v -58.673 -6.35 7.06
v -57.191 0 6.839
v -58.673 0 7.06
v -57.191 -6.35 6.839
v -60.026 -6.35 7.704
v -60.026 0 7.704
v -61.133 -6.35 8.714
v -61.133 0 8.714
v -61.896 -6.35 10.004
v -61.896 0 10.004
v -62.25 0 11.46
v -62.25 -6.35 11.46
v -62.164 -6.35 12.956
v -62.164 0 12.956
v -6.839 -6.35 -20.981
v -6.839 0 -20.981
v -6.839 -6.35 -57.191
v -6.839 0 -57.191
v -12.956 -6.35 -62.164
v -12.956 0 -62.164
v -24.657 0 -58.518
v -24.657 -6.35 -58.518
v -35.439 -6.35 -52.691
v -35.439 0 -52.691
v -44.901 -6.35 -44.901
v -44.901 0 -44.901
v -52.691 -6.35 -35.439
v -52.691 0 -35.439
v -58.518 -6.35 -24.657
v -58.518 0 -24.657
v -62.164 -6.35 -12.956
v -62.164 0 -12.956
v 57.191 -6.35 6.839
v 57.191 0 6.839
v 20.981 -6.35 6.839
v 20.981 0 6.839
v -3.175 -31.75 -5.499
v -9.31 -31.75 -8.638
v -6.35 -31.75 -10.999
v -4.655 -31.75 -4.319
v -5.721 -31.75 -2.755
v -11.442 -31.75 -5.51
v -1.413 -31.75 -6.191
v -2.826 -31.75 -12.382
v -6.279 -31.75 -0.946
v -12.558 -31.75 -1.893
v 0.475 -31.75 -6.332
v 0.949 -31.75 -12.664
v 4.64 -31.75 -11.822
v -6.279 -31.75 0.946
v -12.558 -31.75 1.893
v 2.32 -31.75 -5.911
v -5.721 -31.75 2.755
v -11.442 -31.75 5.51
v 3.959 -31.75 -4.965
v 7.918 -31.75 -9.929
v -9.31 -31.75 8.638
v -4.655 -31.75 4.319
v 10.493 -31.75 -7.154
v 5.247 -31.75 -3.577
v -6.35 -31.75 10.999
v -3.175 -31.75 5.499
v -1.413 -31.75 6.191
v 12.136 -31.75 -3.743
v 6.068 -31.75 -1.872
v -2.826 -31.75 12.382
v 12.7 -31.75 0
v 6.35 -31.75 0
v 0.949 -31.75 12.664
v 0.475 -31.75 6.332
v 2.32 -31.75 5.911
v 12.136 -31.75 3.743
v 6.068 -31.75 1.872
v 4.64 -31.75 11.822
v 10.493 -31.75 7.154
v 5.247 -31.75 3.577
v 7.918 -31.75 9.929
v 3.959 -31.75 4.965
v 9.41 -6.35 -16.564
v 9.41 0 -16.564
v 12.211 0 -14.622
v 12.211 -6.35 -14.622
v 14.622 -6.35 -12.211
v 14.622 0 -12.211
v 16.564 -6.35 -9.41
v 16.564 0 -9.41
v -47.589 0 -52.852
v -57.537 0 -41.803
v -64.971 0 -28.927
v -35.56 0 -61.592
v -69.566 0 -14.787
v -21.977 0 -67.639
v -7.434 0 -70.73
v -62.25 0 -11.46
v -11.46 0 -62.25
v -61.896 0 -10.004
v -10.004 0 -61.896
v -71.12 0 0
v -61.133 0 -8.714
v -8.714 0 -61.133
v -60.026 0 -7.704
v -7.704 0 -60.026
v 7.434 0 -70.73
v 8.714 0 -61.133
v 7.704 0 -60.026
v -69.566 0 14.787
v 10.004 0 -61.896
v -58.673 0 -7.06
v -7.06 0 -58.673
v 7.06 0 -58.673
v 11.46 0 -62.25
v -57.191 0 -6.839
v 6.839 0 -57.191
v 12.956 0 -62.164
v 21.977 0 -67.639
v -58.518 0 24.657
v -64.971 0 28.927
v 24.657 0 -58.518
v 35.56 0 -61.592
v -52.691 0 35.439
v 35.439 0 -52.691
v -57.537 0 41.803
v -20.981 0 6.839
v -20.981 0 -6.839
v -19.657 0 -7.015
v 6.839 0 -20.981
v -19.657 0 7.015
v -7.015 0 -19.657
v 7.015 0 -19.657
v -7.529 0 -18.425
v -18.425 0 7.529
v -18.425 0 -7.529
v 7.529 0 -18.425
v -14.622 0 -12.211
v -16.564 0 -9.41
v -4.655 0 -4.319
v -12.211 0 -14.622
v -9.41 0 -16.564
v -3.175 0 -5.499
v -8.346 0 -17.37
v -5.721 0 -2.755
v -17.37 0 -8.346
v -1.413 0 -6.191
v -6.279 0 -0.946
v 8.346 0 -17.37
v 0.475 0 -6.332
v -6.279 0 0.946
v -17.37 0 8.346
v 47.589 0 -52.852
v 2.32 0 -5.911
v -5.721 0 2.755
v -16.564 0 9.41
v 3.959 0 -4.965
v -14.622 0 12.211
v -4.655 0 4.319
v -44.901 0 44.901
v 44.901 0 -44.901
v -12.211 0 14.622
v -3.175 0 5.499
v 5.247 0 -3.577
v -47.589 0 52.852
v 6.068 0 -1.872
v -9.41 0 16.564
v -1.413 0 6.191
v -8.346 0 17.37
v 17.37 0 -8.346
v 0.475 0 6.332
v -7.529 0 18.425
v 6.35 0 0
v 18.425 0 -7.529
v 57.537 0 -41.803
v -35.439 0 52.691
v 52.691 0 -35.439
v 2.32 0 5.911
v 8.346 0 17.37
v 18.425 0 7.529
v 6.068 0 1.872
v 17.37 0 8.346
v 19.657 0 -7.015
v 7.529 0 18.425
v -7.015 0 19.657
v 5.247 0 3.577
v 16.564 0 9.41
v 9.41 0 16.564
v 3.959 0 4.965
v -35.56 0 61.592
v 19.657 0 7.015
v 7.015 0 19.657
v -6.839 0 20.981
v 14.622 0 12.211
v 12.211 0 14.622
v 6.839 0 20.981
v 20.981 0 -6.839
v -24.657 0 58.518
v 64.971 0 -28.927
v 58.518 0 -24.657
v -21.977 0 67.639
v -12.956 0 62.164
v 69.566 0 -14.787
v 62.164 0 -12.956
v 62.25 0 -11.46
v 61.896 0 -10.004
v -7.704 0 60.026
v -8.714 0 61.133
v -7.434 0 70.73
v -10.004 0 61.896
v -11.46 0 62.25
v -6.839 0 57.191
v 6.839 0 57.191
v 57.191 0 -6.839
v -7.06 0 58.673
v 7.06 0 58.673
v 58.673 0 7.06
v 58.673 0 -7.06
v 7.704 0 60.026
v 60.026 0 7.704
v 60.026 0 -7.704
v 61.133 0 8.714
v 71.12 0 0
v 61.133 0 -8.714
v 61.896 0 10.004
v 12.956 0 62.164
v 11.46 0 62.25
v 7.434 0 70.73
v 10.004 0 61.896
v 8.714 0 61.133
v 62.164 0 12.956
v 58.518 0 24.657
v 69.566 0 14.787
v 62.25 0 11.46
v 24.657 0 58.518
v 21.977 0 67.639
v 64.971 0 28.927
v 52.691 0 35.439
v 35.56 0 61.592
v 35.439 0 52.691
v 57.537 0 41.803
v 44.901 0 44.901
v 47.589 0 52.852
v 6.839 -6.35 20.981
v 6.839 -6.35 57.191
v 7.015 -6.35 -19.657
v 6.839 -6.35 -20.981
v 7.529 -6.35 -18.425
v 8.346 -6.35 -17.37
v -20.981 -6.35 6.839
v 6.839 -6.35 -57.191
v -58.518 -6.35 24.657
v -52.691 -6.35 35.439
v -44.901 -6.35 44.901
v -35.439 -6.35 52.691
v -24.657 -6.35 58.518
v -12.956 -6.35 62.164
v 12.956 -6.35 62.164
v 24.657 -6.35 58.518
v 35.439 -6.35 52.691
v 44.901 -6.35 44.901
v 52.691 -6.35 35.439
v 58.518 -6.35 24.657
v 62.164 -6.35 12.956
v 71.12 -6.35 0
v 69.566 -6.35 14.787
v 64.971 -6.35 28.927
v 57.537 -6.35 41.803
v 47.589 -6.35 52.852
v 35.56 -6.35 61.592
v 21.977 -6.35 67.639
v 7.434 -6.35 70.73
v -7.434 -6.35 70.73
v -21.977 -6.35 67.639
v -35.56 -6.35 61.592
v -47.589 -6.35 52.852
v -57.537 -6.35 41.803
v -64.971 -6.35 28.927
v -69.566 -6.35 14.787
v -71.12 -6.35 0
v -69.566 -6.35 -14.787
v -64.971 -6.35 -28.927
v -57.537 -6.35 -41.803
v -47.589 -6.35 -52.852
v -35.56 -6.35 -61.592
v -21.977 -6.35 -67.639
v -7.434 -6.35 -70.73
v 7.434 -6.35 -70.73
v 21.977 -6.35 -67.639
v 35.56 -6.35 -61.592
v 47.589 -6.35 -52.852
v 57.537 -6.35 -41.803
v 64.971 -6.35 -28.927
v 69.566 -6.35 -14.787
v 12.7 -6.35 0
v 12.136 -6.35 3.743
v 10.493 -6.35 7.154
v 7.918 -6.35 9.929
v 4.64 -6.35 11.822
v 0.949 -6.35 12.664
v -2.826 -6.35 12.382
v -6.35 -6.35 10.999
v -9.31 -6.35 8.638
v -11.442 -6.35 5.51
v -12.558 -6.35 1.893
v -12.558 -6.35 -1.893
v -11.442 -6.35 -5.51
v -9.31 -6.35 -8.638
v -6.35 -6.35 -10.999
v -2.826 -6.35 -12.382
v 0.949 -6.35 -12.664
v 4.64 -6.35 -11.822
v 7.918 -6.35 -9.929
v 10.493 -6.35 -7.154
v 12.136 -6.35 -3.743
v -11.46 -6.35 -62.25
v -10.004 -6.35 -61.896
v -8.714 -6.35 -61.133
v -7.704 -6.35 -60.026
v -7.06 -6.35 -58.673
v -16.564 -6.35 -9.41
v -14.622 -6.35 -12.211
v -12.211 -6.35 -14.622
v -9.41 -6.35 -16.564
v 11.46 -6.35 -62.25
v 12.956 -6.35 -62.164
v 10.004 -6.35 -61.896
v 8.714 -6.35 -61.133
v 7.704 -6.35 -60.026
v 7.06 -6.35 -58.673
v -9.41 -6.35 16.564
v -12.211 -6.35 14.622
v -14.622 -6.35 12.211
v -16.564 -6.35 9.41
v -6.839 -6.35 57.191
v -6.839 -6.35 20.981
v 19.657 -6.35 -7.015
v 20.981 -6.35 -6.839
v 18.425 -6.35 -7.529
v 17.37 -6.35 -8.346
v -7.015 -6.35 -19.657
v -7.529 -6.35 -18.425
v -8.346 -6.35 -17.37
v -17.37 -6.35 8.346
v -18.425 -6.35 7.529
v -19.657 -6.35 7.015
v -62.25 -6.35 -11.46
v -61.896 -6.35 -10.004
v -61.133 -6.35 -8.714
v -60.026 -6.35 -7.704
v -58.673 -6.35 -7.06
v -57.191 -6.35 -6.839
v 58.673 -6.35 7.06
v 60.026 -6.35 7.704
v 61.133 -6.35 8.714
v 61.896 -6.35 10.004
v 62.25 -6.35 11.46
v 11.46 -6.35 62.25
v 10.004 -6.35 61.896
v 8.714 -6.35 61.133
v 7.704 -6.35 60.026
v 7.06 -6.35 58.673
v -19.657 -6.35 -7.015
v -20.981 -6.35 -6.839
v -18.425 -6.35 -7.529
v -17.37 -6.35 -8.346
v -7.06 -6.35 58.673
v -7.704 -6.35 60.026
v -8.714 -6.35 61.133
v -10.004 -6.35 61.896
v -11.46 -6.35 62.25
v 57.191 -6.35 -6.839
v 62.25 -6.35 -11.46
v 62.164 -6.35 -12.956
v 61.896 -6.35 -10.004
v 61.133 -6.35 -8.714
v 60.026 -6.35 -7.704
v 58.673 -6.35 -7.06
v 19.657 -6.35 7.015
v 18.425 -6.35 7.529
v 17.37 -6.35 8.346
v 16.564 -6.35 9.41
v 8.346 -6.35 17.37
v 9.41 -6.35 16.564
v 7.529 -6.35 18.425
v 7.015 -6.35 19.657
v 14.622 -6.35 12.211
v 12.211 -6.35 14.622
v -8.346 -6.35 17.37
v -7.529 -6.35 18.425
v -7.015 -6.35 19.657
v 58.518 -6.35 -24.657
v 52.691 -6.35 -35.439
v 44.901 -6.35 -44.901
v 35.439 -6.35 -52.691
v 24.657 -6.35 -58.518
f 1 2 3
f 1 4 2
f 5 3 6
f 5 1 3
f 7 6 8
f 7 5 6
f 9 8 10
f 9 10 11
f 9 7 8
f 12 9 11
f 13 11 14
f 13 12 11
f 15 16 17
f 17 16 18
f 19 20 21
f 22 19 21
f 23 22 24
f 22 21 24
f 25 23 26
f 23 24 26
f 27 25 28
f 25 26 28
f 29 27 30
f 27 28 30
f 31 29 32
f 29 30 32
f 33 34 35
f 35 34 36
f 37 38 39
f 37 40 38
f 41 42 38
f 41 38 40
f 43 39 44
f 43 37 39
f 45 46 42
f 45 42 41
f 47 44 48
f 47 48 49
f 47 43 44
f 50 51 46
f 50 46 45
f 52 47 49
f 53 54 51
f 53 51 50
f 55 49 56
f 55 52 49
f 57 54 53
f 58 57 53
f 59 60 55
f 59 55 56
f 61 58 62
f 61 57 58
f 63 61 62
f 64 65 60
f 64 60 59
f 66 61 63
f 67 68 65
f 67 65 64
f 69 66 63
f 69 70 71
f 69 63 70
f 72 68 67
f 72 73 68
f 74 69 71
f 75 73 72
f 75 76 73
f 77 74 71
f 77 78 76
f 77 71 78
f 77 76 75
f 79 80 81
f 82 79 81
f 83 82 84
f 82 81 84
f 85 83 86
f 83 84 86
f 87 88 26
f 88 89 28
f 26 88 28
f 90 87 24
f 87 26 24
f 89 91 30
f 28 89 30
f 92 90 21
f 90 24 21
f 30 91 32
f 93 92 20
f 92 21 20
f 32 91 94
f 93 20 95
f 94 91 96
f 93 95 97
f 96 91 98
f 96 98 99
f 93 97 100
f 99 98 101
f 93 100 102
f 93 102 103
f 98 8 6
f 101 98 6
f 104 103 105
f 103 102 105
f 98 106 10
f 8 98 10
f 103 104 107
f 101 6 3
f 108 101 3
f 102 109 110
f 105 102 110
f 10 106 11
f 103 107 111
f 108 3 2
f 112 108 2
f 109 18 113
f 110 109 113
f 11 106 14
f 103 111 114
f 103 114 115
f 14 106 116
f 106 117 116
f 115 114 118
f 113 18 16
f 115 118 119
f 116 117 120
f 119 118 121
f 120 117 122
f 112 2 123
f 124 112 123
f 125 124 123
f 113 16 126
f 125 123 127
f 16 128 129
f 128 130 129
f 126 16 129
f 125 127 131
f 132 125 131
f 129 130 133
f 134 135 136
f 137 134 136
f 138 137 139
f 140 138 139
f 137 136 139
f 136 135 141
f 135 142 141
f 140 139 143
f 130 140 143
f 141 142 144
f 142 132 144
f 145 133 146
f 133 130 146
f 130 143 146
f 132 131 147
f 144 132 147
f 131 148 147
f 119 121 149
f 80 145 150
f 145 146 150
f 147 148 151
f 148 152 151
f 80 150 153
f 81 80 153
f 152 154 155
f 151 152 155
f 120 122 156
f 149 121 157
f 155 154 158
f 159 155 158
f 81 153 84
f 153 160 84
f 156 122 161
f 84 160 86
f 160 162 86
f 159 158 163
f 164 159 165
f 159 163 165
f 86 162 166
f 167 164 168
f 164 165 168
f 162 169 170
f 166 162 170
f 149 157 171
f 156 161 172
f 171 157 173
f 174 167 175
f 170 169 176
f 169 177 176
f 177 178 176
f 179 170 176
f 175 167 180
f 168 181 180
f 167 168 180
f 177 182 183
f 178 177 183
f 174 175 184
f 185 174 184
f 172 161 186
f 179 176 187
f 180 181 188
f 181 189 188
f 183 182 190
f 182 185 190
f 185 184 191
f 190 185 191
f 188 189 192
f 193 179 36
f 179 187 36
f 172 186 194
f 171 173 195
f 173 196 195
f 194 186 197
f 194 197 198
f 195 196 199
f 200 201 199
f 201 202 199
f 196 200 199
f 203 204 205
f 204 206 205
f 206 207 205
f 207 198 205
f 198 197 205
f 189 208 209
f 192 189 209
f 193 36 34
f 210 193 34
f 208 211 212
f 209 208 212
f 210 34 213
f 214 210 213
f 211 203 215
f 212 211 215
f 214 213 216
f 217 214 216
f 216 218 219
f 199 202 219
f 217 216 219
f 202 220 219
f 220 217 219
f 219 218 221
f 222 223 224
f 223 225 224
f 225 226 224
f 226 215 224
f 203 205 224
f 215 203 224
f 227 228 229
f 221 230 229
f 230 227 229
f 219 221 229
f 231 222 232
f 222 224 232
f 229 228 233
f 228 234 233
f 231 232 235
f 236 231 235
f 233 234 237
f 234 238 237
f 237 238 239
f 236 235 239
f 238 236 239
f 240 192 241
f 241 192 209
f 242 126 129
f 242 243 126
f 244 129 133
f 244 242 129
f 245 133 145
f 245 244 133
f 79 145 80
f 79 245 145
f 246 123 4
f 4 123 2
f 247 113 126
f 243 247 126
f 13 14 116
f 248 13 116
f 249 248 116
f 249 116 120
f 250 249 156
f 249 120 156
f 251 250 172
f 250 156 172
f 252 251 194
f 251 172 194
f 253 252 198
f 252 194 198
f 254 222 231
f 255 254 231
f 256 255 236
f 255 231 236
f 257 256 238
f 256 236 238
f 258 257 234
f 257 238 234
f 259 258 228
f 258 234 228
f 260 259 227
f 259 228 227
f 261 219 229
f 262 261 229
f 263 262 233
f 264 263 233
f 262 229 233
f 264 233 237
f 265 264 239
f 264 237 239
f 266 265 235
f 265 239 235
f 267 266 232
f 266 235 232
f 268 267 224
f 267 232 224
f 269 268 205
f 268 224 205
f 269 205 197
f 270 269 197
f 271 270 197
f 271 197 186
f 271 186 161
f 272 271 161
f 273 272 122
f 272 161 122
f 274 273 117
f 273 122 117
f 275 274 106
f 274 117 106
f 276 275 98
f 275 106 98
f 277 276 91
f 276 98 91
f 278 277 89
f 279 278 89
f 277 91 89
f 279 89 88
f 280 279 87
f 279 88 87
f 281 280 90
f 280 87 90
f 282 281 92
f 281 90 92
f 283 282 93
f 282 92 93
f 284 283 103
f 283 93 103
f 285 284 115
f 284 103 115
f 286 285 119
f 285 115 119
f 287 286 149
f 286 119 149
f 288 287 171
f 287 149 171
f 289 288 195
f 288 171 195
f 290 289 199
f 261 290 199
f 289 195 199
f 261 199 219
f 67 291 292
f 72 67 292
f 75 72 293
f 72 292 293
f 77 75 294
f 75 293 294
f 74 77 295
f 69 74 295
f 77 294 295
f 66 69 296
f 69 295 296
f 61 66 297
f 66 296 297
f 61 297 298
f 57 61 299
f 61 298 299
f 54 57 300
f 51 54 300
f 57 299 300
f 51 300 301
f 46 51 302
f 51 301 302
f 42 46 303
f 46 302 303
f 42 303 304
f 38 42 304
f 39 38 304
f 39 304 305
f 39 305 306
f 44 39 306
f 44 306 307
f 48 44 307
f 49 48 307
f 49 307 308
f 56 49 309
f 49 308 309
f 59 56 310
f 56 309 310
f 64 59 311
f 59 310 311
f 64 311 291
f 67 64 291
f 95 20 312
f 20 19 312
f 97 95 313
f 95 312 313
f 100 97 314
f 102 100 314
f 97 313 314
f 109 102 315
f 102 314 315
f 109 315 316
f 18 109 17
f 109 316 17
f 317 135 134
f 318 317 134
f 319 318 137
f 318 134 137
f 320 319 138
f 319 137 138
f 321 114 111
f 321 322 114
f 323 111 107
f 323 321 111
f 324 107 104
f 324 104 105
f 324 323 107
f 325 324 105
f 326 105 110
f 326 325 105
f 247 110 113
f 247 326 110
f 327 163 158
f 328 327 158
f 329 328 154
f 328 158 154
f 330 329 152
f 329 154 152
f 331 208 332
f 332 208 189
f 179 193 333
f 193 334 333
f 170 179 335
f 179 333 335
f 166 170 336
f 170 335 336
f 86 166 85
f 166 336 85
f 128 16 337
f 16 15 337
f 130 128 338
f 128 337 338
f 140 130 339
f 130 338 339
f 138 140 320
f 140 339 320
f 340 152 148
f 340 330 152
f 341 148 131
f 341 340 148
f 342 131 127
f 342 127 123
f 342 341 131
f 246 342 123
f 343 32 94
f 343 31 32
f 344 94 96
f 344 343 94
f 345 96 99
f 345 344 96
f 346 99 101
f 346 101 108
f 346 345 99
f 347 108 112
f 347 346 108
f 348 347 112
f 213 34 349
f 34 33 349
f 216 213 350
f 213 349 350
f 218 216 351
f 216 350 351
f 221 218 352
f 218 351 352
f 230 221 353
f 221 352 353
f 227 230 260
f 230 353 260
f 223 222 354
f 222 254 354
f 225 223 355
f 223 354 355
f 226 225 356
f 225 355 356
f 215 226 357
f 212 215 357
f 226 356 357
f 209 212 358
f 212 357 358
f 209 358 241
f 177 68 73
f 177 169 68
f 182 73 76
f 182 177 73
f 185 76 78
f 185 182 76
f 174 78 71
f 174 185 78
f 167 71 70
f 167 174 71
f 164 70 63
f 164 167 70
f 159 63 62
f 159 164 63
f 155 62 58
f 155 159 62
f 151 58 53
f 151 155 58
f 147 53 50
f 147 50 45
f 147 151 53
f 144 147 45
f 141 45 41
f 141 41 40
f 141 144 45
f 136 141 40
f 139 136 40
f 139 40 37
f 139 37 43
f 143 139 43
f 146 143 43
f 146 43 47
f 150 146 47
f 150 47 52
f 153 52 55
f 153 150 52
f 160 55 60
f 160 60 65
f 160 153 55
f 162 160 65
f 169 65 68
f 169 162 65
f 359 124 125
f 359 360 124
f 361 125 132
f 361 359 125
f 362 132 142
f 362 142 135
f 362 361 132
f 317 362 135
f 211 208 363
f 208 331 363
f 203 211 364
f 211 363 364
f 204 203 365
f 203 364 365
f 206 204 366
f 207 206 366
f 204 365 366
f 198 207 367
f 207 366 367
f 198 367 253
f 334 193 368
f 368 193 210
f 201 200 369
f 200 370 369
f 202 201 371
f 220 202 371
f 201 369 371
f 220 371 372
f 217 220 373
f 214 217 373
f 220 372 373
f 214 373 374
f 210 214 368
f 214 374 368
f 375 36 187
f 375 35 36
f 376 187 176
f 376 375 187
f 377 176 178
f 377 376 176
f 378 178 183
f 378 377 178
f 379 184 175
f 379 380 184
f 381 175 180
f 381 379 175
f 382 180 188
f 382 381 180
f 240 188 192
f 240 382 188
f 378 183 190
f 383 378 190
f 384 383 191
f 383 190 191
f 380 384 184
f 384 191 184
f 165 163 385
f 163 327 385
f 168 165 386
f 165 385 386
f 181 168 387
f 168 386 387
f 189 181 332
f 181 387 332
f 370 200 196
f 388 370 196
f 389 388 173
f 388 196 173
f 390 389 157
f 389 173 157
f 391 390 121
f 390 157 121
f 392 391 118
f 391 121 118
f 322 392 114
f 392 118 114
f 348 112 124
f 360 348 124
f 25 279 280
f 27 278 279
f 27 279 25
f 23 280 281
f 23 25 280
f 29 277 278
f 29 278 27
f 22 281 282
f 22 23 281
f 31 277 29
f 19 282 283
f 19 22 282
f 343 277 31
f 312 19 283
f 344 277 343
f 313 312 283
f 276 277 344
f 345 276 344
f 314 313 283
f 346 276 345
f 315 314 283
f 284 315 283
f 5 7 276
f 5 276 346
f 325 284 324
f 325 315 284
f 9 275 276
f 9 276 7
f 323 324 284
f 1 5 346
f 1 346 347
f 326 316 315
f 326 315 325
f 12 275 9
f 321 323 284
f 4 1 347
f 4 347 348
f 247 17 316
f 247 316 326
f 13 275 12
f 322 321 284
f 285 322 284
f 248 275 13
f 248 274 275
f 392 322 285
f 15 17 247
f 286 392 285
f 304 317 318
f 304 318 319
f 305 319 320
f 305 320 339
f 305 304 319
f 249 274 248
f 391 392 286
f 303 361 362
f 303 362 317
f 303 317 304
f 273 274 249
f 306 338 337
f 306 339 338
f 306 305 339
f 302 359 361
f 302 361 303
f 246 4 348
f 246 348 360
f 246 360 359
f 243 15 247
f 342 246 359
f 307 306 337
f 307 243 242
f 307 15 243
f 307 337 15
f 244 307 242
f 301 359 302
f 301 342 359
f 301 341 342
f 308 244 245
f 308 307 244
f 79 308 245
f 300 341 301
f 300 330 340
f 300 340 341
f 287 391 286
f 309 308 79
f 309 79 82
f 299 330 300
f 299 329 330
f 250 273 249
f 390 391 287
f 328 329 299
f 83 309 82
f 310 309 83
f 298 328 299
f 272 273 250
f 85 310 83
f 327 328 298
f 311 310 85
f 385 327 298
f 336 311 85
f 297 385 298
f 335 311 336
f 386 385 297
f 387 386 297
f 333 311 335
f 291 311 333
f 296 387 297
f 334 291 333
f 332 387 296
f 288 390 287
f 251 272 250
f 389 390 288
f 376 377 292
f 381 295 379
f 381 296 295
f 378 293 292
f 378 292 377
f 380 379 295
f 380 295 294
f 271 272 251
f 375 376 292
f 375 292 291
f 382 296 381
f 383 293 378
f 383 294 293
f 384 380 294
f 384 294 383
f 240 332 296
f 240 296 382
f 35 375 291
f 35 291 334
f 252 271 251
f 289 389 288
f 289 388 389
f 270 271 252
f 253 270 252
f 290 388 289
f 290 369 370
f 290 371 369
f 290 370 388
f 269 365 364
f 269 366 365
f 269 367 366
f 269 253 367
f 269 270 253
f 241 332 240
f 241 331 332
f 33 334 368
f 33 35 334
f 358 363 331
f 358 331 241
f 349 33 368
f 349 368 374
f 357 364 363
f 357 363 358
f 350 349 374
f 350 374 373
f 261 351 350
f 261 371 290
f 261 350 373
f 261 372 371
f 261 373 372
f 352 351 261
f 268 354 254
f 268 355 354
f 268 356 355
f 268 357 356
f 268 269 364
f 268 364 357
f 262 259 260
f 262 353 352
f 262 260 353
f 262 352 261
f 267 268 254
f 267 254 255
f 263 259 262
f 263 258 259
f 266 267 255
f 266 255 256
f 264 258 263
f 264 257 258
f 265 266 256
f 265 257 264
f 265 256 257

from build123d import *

# Parameters (mm, degrees)
F0_R     = 71.12
F0_R_2   = 12.7
F0_R_3   = 6.35
F1_DEPTH = 6.35
F2_R     = 12.7
F2_R_2   = 6.35
F3_DEPTH = 25.4
F4_R     = 5.08


with BuildPart() as f1:
    # F0 (on Front) → F1 (new body)
    with BuildSketch(Plane.XZ):
        Circle(F0_R)
        with BuildLine():
            Line((-6.839159, -17.78), (-6.839159, -63.130626))
            ThreePointArc((-6.839159, -63.130626), (-44.901281, -44.901281), (-63.130626, -6.839159))
            Line((-63.130626, -6.839159), (-17.78, -6.839159))
            ThreePointArc((-17.78, -6.839159), (-13.470384, -13.470384), (-6.839159, -17.78))
        make_face(mode=Mode.SUBTRACT)
        Circle(F0_R_2, mode=Mode.SUBTRACT)
        with BuildLine():
            Line((17.78, -6.839159), (63.130626, -6.839159))
            ThreePointArc((63.130626, -6.839159), (44.901281, -44.901281), (6.839159, -63.130626))
            Line((6.839159, -63.130626), (6.839159, -17.78))
            ThreePointArc((6.839159, -17.78), (13.470384, -13.470384), (17.78, -6.839159))
        make_face(mode=Mode.SUBTRACT)
        with BuildLine():
            Line((-6.839159, 63.130626), (-6.839159, 17.78))
            ThreePointArc((-6.839159, 17.78), (-13.470384, 13.470384), (-17.78, 6.839159))
            Line((-17.78, 6.839159), (-63.130626, 6.839159))
            ThreePointArc((-63.130626, 6.839159), (-44.901281, 44.901281), (-6.839159, 63.130626))
        make_face(mode=Mode.SUBTRACT)
        with BuildLine():
            ThreePointArc((6.839159, 63.130626), (44.901281, 44.901281), (63.130626, 6.839159))
            Line((63.130626, 6.839159), (17.78, 6.839159))
            ThreePointArc((17.78, 6.839159), (13.470384, 13.470384), (6.839159, 17.78))
            Line((6.839159, 17.78), (6.839159, 63.130626))
        make_face(mode=Mode.SUBTRACT)
        Circle(F0_R_2)
        Circle(F0_R_3, mode=Mode.SUBTRACT)
    extrude(amount=F1_DEPTH)

    # F2 (on face) → F3 (join)
    with BuildSketch(Plane.XZ.offset(6.35)):
        Circle(F2_R)
        Circle(F2_R_2, mode=Mode.SUBTRACT)
    extrude(amount=F3_DEPTH)

    # F4
    f4_edges = [f1.edges().sort_by_distance(p)[0] for p in [
        (6.839159, -3.175, 63.130626),
        (6.839159, -3.175, 17.78),
        (17.78, -3.175, 6.839159),
        (63.130626, -3.175, 6.839159),
        (17.78, -3.175, -6.839159),
        (6.839159, -3.175, -17.78),
        (63.130626, -3.175, -6.839159),
        (6.839159, -3.175, -63.130626),
        (-6.839159, -3.175, -63.130626),
        (-17.78, -3.175, -6.839159),
        (-6.839159, -3.175, -17.78),
        (-63.130626, -3.175, -6.839159),
        (-17.78, -3.175, 6.839159),
        (-63.130626, -3.175, 6.839159),
        (-6.839159, -3.175, 63.130626),
        (-6.839159, -3.175, 17.78),
    ]]
    fillet(f4_edges, radius=F4_R)


solid = f1.part
